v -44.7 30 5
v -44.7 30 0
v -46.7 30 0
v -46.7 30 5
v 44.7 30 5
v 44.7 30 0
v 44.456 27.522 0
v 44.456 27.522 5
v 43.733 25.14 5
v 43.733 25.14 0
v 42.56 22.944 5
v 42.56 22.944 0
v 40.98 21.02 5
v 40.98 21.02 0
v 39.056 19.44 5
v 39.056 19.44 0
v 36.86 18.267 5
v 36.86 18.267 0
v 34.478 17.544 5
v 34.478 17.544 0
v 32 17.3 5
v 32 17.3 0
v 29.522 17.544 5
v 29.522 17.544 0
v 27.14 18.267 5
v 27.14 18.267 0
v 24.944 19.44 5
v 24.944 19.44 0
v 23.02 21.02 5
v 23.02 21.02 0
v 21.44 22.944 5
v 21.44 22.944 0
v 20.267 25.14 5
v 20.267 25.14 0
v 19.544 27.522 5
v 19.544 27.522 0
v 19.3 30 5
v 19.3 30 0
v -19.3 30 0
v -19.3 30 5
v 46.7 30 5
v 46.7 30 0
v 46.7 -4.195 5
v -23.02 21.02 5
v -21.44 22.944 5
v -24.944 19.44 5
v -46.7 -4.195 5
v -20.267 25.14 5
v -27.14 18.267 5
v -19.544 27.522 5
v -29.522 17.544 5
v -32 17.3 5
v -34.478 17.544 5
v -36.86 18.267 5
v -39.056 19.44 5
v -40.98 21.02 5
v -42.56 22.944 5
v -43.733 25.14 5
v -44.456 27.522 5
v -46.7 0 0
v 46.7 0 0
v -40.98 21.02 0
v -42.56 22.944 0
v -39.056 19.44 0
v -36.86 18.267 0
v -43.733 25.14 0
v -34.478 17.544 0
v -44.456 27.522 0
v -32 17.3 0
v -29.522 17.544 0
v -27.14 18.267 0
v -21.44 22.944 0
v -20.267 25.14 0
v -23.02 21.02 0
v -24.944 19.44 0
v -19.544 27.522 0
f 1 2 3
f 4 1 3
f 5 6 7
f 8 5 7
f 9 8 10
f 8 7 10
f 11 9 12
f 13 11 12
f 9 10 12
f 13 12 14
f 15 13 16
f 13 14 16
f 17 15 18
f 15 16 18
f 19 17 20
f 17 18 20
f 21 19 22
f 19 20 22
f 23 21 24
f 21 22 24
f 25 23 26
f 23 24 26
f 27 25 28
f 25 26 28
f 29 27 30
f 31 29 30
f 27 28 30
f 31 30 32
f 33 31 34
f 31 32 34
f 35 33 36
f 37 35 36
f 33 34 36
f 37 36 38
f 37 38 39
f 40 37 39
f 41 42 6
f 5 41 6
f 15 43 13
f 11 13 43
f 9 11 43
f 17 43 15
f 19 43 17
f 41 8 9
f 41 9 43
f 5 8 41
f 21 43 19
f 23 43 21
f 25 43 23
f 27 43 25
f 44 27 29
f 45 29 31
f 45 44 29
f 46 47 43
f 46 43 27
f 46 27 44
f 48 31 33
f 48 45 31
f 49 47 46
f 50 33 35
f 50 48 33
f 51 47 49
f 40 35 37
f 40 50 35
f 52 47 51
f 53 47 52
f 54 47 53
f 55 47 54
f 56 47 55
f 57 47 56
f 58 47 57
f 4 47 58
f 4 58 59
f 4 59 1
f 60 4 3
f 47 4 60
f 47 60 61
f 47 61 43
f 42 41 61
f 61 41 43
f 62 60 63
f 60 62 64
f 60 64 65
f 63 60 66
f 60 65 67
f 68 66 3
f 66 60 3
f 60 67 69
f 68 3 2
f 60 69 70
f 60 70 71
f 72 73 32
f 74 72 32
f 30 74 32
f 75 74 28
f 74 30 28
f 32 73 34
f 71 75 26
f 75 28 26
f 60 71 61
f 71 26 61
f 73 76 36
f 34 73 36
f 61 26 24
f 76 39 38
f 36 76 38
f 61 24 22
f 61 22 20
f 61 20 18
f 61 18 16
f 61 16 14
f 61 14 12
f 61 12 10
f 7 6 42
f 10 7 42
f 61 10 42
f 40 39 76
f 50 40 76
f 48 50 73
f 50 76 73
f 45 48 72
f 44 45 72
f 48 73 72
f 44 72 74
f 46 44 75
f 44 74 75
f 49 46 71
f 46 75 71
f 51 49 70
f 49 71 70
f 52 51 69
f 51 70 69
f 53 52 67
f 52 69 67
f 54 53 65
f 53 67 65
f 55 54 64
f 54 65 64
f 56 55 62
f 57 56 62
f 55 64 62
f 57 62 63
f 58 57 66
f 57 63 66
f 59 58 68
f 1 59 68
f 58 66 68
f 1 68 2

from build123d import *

# Parameters (mm, degrees)
F1_DEPTH = 5
F3_DEPTH = 93.4


with BuildPart() as f1:
    # F0 (on Top) → F1 (new body)
    with BuildSketch(Plane.XY):
        with BuildLine():
            Line((-46.7, 0), (0, 0))
            Line((0, 0), (0, 30))
            Line((0, 30), (-19.3, 30))
            ThreePointArc((-19.3, 30), (-32, 17.3), (-44.7, 30))
            Line((-44.7, 30), (-46.7, 30))
            Line((-46.7, 30), (-46.7, 0))
        make_face()
        with BuildLine():
            Line((0, 30), (0, 0))
            Line((0, 0), (46.7, 0))
            Line((46.7, 0), (46.7, 30))
            Line((46.7, 30), (44.7, 30))
            ThreePointArc((44.7, 30), (32, 17.3), (19.3, 30))
            Line((19.3, 30), (0, 30))
        make_face()
    extrude(amount=F1_DEPTH)

    # F2 (on face) → F3 (join, through all)
    with BuildSketch(Plane(origin=(-46.7, 0, 0), x_dir=(0, -1, 0), z_dir=(-1, 0, 0))):
        Polygon((0, 5), (0, 0), (4.195498, 5), align=None)
    extrude(amount=-F3_DEPTH)


solid = f1.part
